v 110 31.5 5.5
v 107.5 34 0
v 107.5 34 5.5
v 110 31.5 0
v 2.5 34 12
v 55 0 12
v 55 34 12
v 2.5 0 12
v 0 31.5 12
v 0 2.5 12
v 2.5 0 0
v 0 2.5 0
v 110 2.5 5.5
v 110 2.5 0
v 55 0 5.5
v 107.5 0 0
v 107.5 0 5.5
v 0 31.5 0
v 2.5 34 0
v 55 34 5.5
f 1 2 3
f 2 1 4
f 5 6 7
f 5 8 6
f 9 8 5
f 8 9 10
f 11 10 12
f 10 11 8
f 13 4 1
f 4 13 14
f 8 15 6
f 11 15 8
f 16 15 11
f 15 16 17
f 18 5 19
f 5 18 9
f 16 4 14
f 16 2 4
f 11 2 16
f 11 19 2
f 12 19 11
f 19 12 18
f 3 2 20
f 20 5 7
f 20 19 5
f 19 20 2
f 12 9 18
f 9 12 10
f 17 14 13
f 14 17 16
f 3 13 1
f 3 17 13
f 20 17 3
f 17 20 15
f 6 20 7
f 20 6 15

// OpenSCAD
$fn = 32;

// ----------------------------------------------------------------------
// Stepped bar: endstep, 110 x 34 x 12/5.5 mm
// ----------------------------------------------------------------------

// --- parameters (mm) ---
bar_l = 110;              // bar length, X
bar_w = 34;               // bar width, Y
plate_t = 12;             // thickness of the thick zone, Z
thin_t = 5.5;             // thickness of the thin zone
corner_c = 2.5;           // corner chamfer of the bar
step_cut = 6.5;           // material removed from the thin zone
step_x = 55;              // step position from the left end
depth_1 = 6.5;            // depth of cut 1 from the top face

profile = [[2.5, 0], [107.5, 0], [110, 2.5], [110, 31.5], [107.5, 34], [2.5, 34], [0, 31.5], [0, 2.5]];  // primary outline, 8 points, counter clockwise
void_1 = [[55, -1], [111, -1], [111, 35], [55, 35]];  // thin zone beyond the step, 4 points

// --- the one profile operation ---
difference() {
  linear_extrude(height = plate_t) polygon(points = profile);
  translate([0, 0, plate_t - depth_1])
    linear_extrude(height = depth_1 + 1) polygon(points = void_1);
}
